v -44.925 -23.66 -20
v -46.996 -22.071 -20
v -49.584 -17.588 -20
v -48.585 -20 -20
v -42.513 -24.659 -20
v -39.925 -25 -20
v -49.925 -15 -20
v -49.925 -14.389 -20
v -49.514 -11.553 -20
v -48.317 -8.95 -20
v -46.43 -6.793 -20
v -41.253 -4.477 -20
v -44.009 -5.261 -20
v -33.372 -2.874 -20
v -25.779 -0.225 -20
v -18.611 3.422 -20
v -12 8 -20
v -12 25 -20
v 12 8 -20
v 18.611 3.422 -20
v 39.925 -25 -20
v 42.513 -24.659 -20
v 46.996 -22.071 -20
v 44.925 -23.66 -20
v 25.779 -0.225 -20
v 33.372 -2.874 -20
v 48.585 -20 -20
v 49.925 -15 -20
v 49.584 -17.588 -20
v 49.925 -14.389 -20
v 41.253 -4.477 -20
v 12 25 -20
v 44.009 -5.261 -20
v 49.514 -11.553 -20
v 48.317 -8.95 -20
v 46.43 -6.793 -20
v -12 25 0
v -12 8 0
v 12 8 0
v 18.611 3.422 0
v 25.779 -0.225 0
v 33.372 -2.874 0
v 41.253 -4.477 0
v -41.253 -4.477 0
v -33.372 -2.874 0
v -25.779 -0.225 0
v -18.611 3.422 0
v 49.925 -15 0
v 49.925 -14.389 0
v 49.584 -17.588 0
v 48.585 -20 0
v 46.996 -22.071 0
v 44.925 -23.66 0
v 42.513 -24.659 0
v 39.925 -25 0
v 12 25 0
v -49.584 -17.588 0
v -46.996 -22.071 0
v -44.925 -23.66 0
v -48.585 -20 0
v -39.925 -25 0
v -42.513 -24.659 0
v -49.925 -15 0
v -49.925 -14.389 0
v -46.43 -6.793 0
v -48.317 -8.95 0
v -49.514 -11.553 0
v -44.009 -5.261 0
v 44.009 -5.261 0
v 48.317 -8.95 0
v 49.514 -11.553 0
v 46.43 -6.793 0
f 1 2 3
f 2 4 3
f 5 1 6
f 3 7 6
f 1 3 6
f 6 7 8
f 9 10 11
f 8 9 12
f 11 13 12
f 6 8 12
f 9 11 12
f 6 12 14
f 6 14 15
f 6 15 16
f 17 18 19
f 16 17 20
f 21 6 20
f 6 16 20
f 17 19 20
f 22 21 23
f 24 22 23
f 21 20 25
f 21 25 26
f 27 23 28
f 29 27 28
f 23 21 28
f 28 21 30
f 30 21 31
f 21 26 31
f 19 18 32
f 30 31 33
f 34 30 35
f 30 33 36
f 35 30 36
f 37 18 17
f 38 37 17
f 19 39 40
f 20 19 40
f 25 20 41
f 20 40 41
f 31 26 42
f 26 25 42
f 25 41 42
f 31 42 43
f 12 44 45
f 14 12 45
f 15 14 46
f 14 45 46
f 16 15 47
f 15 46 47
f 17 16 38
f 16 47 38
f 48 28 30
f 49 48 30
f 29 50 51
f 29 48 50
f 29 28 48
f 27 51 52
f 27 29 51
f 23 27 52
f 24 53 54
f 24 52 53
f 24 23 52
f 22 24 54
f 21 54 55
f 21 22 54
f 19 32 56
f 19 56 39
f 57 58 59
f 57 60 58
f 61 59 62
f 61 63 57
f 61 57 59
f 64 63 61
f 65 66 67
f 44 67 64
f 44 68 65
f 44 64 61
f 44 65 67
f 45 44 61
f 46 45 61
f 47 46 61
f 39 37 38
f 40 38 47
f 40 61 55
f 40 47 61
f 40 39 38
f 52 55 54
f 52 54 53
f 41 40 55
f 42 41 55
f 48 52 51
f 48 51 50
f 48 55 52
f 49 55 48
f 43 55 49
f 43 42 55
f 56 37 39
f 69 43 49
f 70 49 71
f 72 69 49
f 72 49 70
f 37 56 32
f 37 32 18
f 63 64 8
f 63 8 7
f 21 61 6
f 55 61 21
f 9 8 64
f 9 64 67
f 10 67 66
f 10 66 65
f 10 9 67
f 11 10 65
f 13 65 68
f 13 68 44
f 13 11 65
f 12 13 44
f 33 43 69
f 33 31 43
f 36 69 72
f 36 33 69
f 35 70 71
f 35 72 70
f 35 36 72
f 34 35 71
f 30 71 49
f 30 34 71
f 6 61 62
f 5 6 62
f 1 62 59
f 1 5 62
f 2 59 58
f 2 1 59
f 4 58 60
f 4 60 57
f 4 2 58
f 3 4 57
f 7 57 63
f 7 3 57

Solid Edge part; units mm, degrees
sketch "Sketch1" plane through (0, 0, 0) normal (0, 0, 1) x (1, 0, 0)
  line L0 (-49.925, -25) -> (49.925, -25)
  line L1 (49.925, -25) -> (49.925, 25)
  line L2 (49.925, 25) -> (-49.925, 25)
  line L3 (-49.925, 25) -> (-49.925, -25)
extrude "Protrusion1" add sketch "Sketch1" against normal blind 20
sketch "Sketch2" plane through (0, 0, 0) normal (0, 0, 1) x (1, 0, 0)
  line L0 (-49.925, 25) -> (-12, 25)
  line L1 (-12, 25) -> (-12, 8)
  line L2 (-12, 8) -> (-49.925, 8)
  line L3 (-49.925, 8) -> (-49.925, 25)
  line L4 (49.925, 25) -> (12, 25)
  line L5 (12, 25) -> (12, 8)
  line L6 (12, 8) -> (49.925, 8)
  line L7 (49.925, 8) -> (49.925, 25)
extrude "ExtrudedCutout_1" cut sketch "Sketch2" against normal blind 20
sketch "Sketch3" plane through (0, 0, 0) normal (0, 0, 1) x (1, 0, 0)
  arc A0 (-49.925, -5) -> (-12, 8) centre (-49.166, 54.6052) ccw
  line L0 (-49.925, 8) -> (-12, 8)
  line L1 (-49.925, -5) -> (-49.925, 8)
  arc A1 (49.925, -5) -> (12, 8) centre (49.166, 54.6052) cw
  line L2 (12, 8) -> (49.925, 8)
  line L3 (49.925, 8) -> (49.925, -5)
extrude "ExtrudedCutout_2" cut sketch "Sketch3" against normal blind 20
fillet "Round_1" radius 10 4 edges at (49.925, -25, -10) (49.925, -5, -10) (-49.925, -25, -10) (-49.925, -5, -10)
